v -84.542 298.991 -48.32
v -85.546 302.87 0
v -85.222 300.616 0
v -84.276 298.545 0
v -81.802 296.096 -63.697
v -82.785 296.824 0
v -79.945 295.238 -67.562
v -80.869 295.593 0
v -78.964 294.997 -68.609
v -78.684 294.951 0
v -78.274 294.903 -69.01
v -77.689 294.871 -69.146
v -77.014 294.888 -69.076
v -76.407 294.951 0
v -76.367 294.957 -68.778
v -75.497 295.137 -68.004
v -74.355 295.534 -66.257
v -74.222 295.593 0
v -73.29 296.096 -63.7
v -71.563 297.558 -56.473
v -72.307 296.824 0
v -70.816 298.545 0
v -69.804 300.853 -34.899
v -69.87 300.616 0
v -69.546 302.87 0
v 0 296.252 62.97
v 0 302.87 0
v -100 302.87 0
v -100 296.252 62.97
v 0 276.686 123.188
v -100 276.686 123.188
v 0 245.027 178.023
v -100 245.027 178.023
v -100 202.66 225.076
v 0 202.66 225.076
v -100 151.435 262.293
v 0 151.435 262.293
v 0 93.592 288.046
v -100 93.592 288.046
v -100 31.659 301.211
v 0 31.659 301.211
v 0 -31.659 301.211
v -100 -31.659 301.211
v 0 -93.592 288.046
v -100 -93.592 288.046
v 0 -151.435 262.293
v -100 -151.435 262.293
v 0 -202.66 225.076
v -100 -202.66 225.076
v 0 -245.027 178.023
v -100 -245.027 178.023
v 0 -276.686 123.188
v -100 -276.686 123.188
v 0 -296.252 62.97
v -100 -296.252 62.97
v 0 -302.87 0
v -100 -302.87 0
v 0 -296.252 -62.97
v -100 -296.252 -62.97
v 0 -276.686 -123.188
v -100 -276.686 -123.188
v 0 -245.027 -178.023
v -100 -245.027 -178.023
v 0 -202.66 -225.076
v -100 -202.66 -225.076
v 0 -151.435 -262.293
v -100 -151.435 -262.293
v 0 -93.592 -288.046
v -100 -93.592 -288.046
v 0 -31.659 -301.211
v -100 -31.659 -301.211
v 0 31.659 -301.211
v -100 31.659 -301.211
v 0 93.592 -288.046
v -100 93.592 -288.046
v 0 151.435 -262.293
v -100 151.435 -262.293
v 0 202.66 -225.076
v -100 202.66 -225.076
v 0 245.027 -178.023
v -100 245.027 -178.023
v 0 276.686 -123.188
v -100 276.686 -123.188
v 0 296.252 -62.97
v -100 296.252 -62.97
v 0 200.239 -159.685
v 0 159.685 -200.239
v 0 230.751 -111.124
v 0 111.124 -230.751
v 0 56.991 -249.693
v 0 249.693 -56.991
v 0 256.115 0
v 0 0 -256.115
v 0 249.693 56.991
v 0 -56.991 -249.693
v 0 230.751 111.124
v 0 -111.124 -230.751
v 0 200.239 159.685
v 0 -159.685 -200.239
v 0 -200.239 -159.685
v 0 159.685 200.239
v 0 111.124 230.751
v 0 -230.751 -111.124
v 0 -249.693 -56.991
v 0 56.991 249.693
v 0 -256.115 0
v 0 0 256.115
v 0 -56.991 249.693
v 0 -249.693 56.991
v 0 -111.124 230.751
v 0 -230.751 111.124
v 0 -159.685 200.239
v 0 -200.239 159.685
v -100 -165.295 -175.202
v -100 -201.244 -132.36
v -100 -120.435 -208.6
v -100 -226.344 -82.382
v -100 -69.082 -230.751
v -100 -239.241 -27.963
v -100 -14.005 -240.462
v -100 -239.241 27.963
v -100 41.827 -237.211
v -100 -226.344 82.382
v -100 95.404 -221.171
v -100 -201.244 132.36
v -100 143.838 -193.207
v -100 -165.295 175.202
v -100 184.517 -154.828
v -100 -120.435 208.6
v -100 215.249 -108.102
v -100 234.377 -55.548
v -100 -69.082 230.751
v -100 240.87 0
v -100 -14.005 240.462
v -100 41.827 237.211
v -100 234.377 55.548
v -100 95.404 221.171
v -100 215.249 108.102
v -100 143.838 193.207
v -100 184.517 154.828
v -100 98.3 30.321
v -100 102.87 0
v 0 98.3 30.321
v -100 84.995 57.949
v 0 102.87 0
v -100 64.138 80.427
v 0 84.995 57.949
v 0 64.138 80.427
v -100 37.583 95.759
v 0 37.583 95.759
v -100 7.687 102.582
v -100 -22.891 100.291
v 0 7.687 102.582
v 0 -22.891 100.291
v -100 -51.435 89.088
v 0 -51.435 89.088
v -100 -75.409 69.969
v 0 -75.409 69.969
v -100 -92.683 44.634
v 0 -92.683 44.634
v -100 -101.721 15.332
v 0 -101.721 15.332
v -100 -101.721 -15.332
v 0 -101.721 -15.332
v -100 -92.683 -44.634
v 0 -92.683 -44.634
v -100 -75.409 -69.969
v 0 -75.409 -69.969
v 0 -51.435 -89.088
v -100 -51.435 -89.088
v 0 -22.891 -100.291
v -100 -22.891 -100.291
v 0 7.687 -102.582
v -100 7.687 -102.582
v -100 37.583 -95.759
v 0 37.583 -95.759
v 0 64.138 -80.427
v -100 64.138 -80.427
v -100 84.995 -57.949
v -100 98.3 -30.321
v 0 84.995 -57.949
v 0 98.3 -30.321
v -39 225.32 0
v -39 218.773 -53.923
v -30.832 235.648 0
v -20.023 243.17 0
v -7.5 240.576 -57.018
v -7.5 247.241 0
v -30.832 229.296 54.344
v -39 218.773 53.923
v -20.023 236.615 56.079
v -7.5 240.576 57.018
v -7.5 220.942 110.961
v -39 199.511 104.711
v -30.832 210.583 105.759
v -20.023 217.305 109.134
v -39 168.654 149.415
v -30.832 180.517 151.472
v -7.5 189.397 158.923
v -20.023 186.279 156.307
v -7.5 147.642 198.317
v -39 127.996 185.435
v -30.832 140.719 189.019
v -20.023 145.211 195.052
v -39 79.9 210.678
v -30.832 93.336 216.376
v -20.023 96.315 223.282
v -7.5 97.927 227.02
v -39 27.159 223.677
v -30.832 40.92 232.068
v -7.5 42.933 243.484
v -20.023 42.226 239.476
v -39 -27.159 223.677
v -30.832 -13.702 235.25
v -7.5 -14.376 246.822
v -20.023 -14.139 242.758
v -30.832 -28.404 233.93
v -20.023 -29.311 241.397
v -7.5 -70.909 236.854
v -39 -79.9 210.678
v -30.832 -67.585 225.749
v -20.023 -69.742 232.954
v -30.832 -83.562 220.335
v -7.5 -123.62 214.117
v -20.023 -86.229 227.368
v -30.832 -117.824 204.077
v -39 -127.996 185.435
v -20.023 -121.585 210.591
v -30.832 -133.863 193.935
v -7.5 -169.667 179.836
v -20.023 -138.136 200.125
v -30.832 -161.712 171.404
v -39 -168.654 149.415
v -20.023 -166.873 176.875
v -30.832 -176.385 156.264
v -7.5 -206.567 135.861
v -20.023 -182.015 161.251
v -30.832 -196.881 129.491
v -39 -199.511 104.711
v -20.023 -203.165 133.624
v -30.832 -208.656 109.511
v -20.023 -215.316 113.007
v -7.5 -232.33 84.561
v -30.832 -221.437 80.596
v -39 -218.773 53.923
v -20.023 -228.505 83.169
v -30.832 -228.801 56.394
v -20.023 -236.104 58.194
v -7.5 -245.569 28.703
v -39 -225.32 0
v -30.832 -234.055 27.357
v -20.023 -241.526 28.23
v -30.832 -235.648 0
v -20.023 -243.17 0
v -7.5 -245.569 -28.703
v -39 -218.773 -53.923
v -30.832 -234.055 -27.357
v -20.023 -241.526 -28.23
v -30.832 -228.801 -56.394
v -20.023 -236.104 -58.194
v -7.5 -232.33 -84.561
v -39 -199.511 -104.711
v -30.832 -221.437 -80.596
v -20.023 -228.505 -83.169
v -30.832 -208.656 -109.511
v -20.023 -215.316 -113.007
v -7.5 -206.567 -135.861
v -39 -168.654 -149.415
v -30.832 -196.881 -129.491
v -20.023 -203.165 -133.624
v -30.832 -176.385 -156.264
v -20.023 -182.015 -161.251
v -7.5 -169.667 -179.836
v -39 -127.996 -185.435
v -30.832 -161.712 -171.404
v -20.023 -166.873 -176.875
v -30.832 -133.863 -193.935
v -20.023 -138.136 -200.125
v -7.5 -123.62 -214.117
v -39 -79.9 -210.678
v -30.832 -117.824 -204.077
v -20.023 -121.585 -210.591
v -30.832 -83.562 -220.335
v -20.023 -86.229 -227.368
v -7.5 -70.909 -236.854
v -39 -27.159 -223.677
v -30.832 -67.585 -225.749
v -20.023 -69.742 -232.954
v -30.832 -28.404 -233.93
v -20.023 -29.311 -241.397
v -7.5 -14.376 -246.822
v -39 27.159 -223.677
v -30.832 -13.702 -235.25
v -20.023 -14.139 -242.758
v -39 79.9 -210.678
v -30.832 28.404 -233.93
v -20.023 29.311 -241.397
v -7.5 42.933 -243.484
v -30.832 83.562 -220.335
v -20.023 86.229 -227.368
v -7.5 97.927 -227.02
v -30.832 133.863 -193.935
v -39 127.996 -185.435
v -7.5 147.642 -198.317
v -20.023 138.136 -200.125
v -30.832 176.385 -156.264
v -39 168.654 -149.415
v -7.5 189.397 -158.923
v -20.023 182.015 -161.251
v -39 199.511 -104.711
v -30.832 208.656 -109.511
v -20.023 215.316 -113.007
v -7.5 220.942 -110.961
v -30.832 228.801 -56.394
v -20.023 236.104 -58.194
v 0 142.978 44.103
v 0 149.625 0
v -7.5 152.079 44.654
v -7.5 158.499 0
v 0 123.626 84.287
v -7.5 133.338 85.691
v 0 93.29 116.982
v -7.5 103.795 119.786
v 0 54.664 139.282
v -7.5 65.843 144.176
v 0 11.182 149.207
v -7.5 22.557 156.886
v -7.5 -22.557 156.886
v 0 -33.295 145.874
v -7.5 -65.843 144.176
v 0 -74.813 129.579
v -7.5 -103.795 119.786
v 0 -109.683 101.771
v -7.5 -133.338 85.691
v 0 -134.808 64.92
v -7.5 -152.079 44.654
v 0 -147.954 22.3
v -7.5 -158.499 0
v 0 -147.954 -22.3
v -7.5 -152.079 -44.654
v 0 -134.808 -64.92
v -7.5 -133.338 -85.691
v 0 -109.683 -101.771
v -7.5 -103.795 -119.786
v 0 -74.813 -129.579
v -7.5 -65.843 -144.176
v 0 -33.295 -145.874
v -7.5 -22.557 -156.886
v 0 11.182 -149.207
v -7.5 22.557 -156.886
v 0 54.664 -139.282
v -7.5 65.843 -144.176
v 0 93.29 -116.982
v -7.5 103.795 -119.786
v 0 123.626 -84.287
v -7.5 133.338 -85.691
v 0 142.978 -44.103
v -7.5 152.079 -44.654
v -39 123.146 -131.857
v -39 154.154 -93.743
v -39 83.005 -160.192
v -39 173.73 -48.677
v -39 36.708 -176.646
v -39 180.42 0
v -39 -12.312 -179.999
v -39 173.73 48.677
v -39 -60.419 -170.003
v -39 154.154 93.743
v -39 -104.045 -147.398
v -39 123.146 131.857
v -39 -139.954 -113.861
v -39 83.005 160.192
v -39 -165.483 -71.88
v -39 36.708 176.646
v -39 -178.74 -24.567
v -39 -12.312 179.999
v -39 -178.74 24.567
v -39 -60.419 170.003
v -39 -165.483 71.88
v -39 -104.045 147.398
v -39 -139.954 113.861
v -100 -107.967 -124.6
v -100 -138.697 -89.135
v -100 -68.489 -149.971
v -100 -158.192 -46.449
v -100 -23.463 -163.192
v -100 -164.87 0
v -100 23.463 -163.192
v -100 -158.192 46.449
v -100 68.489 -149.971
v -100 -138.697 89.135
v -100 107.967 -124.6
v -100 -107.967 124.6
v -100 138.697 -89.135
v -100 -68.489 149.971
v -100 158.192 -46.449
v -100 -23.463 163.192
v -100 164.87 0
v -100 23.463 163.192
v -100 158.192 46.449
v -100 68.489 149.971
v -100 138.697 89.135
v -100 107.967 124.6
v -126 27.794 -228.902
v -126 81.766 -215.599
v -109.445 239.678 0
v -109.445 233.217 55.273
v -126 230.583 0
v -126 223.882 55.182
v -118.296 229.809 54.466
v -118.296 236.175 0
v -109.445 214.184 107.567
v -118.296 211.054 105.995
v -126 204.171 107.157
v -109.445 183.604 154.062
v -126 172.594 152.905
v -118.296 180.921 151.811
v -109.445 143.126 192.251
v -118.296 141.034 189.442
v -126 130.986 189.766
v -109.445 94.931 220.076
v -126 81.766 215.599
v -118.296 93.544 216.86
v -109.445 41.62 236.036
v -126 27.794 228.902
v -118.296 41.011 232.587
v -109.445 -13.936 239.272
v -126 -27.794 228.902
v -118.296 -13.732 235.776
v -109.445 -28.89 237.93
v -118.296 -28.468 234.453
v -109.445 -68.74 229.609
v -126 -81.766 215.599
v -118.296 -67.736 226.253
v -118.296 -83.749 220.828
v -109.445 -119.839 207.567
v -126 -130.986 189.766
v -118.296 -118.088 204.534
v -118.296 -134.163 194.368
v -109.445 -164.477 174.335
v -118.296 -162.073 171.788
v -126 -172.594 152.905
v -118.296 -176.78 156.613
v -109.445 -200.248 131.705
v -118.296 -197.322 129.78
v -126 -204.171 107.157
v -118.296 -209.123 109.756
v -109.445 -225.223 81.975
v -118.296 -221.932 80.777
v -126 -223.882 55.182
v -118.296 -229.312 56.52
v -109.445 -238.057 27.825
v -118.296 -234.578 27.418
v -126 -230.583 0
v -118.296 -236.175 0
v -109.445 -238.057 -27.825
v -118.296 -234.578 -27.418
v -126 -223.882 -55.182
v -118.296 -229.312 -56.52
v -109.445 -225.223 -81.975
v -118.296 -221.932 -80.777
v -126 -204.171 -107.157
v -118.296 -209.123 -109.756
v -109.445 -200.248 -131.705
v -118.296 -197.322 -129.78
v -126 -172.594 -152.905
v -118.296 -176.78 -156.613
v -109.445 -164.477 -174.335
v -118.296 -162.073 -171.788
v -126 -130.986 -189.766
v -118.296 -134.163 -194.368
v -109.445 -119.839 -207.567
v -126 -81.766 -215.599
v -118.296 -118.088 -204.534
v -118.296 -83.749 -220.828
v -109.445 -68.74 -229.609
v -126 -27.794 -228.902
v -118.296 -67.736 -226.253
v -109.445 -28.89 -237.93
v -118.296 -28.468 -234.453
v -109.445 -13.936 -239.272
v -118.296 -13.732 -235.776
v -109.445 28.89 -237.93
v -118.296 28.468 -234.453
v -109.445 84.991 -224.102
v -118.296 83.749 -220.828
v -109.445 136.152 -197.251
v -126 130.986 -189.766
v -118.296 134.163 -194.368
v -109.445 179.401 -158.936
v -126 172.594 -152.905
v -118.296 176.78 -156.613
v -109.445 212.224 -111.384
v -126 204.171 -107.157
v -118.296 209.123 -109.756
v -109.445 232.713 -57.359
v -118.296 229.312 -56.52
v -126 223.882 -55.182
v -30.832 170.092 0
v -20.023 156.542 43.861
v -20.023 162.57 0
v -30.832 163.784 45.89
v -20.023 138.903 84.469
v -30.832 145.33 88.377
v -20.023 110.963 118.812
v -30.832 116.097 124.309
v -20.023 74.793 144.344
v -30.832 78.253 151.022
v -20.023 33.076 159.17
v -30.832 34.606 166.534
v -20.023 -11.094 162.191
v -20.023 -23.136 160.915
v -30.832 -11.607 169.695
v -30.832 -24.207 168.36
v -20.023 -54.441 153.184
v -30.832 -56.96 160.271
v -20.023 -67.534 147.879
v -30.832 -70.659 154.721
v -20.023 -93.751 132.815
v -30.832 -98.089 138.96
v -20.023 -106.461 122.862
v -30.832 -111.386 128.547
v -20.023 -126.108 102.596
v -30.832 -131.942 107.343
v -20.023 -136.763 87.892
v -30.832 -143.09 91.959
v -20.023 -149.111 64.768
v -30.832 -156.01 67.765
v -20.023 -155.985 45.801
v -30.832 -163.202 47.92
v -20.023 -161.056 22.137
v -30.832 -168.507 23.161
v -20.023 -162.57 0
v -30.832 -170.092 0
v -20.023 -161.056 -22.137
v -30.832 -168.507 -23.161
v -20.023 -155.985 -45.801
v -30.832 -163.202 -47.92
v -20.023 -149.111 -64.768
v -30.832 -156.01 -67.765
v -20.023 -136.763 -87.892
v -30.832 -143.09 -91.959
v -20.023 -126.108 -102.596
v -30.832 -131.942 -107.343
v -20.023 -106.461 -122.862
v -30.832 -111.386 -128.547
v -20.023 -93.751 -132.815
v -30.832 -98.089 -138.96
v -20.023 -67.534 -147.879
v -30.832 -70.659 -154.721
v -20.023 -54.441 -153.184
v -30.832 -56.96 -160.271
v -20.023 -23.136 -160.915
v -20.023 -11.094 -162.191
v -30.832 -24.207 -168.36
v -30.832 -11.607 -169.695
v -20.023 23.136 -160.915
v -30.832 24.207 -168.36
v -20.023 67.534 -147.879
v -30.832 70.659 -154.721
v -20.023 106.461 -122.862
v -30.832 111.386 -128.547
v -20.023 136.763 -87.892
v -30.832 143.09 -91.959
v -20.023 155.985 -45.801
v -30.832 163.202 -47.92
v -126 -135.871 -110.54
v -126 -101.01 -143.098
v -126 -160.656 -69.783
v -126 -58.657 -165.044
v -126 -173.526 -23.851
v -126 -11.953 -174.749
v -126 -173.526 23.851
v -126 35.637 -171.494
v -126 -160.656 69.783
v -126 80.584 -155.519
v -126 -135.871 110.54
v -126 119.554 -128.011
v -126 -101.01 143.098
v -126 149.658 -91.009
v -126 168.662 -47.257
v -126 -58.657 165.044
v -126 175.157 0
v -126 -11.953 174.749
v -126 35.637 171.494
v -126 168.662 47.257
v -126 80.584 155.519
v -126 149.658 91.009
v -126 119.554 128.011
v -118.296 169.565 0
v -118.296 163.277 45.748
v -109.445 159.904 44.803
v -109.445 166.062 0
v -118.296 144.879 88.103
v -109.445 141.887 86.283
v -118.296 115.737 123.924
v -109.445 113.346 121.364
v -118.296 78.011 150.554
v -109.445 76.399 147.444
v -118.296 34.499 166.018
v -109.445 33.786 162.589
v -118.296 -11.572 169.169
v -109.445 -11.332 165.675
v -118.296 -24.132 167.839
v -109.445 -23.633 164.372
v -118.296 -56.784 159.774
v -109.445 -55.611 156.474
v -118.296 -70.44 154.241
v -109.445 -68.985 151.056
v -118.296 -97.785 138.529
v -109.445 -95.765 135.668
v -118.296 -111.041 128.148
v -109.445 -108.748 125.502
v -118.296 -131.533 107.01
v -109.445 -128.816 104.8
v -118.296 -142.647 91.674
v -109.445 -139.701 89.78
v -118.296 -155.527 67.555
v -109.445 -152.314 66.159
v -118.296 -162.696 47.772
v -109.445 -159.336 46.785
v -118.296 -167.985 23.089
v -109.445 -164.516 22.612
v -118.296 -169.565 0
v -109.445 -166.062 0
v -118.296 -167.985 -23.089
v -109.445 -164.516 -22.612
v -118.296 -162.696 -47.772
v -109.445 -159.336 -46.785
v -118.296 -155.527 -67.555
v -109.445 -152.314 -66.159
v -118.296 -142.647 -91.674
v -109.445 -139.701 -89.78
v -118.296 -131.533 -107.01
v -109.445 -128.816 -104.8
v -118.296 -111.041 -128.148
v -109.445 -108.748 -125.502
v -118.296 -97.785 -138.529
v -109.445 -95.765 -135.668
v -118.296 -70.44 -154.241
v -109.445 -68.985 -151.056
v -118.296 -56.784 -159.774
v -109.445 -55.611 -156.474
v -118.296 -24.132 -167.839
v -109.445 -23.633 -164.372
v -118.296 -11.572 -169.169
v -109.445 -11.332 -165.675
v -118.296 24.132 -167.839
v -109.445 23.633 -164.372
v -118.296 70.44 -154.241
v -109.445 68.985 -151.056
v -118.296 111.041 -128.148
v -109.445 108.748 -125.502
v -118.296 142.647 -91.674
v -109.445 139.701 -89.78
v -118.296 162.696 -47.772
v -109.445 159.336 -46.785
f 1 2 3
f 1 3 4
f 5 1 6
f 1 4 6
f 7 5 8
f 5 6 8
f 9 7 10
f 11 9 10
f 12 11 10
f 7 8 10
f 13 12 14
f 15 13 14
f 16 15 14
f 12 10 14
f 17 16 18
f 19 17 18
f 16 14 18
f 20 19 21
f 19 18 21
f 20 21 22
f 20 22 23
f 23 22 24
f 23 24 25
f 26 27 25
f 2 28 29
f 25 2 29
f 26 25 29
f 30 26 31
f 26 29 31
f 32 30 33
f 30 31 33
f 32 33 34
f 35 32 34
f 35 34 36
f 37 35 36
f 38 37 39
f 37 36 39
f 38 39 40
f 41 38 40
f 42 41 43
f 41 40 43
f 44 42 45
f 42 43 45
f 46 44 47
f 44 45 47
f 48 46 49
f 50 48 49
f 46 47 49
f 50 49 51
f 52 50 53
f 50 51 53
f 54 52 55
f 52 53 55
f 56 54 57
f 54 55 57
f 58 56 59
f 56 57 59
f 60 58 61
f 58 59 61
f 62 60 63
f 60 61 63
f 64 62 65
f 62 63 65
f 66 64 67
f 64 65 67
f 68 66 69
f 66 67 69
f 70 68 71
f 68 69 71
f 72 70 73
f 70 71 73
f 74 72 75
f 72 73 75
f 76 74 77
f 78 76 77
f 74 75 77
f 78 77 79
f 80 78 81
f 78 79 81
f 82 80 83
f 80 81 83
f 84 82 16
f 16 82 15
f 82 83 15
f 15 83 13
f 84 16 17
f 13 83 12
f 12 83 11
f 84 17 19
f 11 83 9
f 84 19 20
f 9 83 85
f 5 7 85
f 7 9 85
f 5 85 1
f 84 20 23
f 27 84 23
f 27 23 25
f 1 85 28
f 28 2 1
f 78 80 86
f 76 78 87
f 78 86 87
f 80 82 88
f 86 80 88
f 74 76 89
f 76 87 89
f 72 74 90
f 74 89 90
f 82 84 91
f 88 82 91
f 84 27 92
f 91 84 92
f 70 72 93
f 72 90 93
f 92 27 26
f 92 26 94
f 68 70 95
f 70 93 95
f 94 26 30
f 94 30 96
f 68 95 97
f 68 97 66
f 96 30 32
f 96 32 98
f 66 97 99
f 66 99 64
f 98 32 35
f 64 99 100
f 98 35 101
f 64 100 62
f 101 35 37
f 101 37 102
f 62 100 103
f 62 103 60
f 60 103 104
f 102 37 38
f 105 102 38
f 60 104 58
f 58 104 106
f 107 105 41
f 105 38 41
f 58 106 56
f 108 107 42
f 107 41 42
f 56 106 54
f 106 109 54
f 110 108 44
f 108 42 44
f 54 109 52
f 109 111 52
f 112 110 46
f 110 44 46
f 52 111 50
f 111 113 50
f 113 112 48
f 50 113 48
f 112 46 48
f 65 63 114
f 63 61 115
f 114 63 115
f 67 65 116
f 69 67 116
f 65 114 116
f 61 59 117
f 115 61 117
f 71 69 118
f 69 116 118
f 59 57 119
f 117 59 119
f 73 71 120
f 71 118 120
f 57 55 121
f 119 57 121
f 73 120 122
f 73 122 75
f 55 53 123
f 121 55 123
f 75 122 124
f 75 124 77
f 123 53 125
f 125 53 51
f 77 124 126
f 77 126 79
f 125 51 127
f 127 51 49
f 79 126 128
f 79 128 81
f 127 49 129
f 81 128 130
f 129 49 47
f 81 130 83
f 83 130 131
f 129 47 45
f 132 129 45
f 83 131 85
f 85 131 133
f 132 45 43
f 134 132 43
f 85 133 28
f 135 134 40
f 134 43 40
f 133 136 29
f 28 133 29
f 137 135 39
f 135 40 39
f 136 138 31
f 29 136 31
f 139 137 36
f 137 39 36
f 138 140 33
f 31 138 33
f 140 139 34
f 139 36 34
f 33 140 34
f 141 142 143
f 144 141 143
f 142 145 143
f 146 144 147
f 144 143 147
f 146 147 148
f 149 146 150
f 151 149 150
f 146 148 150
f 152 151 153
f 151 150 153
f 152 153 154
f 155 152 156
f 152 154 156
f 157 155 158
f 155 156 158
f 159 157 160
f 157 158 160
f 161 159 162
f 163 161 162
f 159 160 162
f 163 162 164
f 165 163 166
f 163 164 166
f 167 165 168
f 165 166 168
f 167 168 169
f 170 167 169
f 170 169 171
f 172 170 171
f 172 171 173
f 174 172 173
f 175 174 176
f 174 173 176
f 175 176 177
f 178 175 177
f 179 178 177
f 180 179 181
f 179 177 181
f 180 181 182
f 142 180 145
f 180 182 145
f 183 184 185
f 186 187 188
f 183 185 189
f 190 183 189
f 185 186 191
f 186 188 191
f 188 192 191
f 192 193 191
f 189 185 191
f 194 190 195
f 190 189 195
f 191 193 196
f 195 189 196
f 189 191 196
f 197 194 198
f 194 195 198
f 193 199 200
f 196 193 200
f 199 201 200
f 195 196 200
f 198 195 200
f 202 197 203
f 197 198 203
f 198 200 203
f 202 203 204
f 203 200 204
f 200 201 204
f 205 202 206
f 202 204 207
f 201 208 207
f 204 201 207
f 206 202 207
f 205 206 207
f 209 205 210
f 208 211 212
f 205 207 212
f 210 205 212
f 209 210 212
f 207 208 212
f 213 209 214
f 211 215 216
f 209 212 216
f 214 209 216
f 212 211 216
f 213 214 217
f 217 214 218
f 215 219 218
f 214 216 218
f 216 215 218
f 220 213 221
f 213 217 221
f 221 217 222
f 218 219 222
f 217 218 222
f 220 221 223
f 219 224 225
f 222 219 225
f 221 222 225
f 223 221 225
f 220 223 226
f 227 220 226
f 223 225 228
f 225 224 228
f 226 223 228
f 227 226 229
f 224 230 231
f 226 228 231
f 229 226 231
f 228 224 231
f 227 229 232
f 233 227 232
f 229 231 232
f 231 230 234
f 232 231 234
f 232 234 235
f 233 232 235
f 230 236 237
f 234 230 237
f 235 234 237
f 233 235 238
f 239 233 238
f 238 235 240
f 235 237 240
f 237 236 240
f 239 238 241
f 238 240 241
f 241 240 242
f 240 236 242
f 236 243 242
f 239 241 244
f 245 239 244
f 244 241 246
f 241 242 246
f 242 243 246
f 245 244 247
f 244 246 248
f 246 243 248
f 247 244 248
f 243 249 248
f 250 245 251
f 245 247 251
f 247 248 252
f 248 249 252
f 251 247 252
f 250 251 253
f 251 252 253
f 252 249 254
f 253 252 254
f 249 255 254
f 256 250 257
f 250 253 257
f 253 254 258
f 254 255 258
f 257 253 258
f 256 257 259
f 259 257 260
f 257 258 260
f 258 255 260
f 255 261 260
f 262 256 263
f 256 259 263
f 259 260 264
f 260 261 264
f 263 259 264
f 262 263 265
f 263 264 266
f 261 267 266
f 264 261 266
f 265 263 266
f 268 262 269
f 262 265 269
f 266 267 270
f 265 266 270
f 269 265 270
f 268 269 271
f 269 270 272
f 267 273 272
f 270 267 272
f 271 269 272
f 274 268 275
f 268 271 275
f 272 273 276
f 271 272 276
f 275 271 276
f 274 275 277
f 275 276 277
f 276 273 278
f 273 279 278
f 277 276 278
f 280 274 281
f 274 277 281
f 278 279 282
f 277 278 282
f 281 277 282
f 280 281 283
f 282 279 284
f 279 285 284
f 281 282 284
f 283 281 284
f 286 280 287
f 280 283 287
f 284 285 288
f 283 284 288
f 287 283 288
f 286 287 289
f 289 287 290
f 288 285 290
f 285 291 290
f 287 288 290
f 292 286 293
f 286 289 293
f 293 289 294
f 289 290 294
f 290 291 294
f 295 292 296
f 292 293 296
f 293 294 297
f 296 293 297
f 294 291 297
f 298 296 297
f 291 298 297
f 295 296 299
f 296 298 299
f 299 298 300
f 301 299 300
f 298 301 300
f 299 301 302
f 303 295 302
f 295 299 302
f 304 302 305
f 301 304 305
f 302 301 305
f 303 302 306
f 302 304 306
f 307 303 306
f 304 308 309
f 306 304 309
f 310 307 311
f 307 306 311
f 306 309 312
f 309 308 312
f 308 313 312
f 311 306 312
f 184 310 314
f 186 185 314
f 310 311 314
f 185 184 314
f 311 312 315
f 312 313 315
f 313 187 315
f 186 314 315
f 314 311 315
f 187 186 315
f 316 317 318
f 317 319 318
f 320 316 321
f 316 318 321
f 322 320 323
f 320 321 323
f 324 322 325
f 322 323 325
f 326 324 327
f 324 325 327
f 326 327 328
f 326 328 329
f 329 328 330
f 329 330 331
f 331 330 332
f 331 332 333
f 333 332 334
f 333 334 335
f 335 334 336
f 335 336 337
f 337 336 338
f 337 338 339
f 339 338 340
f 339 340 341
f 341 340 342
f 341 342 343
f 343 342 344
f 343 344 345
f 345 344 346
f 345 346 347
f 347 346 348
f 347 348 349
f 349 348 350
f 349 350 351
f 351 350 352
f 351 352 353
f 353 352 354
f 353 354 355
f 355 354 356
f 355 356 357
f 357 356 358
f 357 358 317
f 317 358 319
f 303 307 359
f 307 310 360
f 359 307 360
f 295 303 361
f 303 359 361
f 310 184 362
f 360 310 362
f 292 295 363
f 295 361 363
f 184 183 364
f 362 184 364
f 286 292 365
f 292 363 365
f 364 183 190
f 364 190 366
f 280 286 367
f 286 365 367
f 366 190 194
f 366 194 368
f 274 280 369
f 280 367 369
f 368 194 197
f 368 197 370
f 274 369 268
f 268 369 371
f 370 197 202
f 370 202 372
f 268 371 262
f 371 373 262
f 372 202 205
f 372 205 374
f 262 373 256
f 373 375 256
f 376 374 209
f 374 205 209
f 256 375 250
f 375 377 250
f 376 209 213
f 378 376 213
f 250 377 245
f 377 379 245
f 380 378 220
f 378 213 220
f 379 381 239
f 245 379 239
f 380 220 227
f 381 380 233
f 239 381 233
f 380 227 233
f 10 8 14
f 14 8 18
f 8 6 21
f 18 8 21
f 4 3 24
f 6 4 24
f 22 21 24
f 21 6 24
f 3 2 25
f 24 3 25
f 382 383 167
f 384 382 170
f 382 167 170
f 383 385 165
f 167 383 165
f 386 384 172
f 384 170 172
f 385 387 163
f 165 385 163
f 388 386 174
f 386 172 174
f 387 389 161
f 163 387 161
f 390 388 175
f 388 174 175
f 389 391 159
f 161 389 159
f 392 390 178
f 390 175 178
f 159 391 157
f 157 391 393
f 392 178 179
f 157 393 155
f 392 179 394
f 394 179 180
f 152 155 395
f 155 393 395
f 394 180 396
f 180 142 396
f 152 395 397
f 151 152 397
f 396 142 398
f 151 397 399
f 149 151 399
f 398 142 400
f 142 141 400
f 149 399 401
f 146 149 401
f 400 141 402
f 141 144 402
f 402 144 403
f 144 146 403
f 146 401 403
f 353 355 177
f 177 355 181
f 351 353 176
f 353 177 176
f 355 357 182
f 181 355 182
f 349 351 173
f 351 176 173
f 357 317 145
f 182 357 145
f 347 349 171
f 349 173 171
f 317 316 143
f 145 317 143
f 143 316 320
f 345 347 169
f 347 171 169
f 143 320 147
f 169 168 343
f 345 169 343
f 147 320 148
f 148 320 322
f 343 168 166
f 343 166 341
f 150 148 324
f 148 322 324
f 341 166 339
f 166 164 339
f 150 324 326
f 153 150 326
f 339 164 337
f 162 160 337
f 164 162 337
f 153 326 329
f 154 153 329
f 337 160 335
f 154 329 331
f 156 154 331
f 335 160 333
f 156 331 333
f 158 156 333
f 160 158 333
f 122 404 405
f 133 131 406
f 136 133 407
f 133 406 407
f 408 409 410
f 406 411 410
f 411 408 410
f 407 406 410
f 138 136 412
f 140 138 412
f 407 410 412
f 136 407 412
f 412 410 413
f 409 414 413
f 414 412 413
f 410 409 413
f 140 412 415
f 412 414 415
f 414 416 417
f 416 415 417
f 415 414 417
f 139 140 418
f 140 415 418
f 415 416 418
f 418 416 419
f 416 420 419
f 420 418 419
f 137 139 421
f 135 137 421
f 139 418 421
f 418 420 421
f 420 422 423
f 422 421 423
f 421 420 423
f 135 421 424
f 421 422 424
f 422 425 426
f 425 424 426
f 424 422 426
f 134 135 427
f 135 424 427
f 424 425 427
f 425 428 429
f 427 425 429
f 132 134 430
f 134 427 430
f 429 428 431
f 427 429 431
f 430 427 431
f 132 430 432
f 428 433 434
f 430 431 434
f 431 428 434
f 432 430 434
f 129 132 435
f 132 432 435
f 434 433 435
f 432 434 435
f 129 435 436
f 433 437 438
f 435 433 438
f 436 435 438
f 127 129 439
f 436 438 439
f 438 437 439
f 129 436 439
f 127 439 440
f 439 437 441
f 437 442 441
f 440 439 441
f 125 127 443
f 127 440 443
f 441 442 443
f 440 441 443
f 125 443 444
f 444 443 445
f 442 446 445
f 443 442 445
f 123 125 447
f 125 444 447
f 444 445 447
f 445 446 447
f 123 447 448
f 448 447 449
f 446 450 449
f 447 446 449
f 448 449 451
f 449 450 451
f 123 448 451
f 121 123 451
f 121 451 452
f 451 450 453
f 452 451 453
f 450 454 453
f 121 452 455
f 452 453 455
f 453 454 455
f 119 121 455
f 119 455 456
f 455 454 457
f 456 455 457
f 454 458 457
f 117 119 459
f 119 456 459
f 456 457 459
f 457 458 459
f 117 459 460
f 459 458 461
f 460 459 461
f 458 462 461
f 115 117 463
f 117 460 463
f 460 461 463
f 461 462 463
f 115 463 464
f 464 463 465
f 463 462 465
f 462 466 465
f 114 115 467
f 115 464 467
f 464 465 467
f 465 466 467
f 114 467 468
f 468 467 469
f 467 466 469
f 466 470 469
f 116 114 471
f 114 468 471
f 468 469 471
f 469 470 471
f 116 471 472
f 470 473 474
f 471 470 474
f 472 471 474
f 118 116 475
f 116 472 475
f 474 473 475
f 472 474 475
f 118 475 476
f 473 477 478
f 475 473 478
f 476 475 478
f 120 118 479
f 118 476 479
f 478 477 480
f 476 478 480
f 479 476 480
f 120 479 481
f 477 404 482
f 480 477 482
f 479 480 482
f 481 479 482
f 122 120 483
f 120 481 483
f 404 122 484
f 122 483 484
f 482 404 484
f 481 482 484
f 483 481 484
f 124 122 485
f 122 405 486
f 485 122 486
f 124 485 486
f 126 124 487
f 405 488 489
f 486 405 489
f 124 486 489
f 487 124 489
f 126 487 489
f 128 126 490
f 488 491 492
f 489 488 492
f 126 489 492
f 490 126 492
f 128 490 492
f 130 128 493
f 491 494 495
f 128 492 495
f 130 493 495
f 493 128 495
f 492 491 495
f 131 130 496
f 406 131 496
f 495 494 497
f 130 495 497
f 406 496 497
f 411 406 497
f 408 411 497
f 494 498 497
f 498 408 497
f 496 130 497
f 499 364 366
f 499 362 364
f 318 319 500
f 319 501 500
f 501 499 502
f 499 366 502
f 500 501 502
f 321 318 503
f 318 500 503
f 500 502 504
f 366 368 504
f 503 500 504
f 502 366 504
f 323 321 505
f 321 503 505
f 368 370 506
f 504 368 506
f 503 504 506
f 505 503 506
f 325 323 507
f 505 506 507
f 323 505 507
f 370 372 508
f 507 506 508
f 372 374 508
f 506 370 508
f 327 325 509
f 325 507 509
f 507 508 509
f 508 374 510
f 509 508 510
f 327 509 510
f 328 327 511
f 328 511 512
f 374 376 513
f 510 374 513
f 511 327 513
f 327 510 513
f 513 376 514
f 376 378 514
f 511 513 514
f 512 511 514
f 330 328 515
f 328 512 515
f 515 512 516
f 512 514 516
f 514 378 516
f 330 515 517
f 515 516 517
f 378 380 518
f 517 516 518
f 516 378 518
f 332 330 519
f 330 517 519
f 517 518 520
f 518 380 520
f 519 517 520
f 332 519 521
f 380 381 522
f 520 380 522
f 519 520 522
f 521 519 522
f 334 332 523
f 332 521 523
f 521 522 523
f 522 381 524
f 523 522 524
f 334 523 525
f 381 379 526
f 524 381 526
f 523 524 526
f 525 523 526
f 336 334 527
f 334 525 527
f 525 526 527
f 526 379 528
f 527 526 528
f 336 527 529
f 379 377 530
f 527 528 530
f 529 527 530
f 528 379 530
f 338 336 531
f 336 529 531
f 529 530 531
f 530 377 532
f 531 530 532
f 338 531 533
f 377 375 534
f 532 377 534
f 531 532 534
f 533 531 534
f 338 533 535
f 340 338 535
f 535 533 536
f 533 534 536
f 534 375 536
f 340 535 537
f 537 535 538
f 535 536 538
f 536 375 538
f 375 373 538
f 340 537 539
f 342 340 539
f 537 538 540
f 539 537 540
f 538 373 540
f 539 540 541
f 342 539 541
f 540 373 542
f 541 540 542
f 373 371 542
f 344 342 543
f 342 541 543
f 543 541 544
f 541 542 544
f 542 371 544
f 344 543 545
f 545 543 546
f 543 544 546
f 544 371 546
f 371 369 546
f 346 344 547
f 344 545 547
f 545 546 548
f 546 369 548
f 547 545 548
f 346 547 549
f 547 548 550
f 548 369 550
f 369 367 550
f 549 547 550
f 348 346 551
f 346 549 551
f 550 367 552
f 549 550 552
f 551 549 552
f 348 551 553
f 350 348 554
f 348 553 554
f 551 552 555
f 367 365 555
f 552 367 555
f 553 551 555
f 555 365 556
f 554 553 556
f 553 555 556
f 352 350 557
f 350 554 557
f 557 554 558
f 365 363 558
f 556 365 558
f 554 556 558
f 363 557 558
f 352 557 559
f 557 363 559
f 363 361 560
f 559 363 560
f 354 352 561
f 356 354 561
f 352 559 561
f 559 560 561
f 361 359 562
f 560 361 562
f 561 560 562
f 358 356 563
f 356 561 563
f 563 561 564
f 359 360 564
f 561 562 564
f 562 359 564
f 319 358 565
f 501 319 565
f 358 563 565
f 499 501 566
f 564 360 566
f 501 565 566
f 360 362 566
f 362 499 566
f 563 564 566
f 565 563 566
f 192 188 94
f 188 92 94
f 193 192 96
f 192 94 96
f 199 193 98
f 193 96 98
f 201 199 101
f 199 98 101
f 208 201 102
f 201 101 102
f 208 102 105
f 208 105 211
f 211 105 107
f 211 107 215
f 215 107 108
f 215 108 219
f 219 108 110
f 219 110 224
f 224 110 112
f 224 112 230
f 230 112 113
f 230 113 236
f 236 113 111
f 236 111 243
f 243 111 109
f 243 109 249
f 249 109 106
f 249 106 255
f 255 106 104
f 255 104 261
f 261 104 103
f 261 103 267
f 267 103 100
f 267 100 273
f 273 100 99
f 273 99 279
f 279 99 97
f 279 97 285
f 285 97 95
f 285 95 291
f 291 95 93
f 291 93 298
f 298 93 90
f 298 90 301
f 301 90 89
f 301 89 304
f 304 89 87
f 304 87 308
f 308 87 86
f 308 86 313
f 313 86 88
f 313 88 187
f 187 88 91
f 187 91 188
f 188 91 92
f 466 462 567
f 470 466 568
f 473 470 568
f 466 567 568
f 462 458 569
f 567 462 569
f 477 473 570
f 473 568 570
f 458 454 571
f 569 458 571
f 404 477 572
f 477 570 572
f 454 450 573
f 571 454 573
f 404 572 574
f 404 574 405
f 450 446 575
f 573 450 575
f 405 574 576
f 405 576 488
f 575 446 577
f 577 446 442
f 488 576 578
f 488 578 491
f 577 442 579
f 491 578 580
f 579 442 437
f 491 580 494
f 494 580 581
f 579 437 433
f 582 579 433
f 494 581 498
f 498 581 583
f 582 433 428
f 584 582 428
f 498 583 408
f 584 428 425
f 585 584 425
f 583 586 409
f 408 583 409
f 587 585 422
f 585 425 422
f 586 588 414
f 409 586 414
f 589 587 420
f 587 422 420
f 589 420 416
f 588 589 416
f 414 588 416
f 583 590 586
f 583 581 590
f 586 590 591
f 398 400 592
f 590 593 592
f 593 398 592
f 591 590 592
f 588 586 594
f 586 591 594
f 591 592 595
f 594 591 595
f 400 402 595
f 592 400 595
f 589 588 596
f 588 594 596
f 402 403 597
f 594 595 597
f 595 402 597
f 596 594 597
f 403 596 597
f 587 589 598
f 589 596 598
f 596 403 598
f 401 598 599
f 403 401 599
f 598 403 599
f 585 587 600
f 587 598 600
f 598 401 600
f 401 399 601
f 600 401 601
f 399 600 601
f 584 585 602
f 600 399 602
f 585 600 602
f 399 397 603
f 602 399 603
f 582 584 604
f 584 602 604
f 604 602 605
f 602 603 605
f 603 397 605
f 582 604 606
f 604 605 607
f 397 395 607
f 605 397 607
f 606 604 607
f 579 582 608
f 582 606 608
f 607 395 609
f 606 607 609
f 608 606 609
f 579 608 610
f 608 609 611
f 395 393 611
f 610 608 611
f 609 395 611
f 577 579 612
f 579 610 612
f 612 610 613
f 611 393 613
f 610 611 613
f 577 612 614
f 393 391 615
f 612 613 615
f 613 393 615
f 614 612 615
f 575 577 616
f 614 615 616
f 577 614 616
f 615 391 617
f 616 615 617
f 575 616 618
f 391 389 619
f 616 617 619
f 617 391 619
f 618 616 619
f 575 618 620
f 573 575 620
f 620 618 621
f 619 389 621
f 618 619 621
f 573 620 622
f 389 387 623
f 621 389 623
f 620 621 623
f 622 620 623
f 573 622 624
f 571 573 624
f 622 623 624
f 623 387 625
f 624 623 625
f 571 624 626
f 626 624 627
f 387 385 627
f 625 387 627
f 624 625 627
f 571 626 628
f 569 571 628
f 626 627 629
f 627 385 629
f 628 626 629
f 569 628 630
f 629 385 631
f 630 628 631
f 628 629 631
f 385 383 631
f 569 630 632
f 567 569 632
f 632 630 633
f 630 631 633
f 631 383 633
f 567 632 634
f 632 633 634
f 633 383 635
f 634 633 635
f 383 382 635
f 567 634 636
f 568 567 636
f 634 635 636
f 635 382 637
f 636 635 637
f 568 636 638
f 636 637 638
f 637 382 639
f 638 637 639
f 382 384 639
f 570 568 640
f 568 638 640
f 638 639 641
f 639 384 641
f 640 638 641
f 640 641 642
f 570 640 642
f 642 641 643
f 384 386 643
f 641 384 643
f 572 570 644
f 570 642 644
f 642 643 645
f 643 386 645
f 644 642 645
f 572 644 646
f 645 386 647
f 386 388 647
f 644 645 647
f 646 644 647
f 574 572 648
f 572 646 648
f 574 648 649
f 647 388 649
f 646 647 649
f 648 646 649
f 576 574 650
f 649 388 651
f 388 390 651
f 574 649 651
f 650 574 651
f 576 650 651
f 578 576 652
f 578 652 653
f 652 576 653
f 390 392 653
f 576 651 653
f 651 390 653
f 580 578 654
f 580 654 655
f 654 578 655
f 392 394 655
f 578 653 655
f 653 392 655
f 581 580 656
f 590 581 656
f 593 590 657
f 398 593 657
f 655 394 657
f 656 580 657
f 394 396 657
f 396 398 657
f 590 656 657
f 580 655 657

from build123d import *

# Parameters (mm, degrees)
F4_D     = 16
F4_DEPTH = 302.871


# Not quite as in the source:
# - a fillet or chamfer that OpenCascade refuses, or shapes differently, is made with other operations: its cross-section is extruded or revolved along the edge and cut away or added


with BuildPart() as f1:
    # F0 (on Top) → F1 (revolve)
    with BuildSketch(Plane.XY):
        with BuildLine():
            Line((0, 302.87), (-100, 302.87))
            Line((-100, 302.87), (-100, 240.87))
            ThreePointArc((-100, 240.87), (-113.9805777598, 238.2047342639), (-126, 230.5828129211))
            Line((-126, 230.5828129211), (-126, 175.1571870789))
            ThreePointArc((-126, 175.1571870789), (-113.9805777598, 167.5352657361), (-100, 164.87))
            Line((-100, 164.87), (-100, 102.87))
            Line((-100, 102.87), (0, 102.87))
            Line((0, 102.87), (0, 157.87))
            ThreePointArc((0, 157.87), (-22.5250139353, 163.9133093395), (-39, 180.4200556794))
            Line((-39, 180.4200556794), (-39, 225.3199443206))
            ThreePointArc((-39, 225.3199443206), (-22.5250139353, 241.8266906605), (0, 247.87))
            Line((0, 247.87), (0, 302.87))
        make_face()
    revolve(axis=Axis((-229.3646931648, 0, 0), (1, 0, 0)))

    # F2: chamfer of 9 on 2 edges, made by hand

    # F2_s1 → F2_t2 (revolve, cut)
    with BuildSketch(Plane.XY):
        with BuildLine():
            Line((-7.5, 247.2405983732), (0, 256.1147180479))
            Line((0, 256.1147180479), (0, 247.87))
            ThreePointArc((0, 247.87), (-3.8908074648, 247.7014802039), (-7.5, 247.2405983732))
        make_face()
    revolve(axis=Axis((0, 0, 0), (1, 0, 0)), mode=Mode.SUBTRACT)

    # F2_s3 → F2_t4 (revolve, cut)
    with BuildSketch(Plane.XY):
        with BuildLine():
            Line((0, 149.6252819521), (-7.5, 158.4994016268))
            ThreePointArc((-7.5, 158.4994016268), (-3.8908074648, 158.0385197961), (0, 157.87))
            Line((0, 157.87), (0, 149.6252819521))
        make_face()
    revolve(axis=Axis((0, 0, 0), (1, 0, 0)), mode=Mode.SUBTRACT)

    # F4 (through all, one way)
    with BuildSketch(Plane.XY):
        with Locations((-77.5457248092, 302.87)):
            Circle(F4_D / 2)
    extrude(amount=-F4_DEPTH, mode=Mode.SUBTRACT)


solid = f1.part
